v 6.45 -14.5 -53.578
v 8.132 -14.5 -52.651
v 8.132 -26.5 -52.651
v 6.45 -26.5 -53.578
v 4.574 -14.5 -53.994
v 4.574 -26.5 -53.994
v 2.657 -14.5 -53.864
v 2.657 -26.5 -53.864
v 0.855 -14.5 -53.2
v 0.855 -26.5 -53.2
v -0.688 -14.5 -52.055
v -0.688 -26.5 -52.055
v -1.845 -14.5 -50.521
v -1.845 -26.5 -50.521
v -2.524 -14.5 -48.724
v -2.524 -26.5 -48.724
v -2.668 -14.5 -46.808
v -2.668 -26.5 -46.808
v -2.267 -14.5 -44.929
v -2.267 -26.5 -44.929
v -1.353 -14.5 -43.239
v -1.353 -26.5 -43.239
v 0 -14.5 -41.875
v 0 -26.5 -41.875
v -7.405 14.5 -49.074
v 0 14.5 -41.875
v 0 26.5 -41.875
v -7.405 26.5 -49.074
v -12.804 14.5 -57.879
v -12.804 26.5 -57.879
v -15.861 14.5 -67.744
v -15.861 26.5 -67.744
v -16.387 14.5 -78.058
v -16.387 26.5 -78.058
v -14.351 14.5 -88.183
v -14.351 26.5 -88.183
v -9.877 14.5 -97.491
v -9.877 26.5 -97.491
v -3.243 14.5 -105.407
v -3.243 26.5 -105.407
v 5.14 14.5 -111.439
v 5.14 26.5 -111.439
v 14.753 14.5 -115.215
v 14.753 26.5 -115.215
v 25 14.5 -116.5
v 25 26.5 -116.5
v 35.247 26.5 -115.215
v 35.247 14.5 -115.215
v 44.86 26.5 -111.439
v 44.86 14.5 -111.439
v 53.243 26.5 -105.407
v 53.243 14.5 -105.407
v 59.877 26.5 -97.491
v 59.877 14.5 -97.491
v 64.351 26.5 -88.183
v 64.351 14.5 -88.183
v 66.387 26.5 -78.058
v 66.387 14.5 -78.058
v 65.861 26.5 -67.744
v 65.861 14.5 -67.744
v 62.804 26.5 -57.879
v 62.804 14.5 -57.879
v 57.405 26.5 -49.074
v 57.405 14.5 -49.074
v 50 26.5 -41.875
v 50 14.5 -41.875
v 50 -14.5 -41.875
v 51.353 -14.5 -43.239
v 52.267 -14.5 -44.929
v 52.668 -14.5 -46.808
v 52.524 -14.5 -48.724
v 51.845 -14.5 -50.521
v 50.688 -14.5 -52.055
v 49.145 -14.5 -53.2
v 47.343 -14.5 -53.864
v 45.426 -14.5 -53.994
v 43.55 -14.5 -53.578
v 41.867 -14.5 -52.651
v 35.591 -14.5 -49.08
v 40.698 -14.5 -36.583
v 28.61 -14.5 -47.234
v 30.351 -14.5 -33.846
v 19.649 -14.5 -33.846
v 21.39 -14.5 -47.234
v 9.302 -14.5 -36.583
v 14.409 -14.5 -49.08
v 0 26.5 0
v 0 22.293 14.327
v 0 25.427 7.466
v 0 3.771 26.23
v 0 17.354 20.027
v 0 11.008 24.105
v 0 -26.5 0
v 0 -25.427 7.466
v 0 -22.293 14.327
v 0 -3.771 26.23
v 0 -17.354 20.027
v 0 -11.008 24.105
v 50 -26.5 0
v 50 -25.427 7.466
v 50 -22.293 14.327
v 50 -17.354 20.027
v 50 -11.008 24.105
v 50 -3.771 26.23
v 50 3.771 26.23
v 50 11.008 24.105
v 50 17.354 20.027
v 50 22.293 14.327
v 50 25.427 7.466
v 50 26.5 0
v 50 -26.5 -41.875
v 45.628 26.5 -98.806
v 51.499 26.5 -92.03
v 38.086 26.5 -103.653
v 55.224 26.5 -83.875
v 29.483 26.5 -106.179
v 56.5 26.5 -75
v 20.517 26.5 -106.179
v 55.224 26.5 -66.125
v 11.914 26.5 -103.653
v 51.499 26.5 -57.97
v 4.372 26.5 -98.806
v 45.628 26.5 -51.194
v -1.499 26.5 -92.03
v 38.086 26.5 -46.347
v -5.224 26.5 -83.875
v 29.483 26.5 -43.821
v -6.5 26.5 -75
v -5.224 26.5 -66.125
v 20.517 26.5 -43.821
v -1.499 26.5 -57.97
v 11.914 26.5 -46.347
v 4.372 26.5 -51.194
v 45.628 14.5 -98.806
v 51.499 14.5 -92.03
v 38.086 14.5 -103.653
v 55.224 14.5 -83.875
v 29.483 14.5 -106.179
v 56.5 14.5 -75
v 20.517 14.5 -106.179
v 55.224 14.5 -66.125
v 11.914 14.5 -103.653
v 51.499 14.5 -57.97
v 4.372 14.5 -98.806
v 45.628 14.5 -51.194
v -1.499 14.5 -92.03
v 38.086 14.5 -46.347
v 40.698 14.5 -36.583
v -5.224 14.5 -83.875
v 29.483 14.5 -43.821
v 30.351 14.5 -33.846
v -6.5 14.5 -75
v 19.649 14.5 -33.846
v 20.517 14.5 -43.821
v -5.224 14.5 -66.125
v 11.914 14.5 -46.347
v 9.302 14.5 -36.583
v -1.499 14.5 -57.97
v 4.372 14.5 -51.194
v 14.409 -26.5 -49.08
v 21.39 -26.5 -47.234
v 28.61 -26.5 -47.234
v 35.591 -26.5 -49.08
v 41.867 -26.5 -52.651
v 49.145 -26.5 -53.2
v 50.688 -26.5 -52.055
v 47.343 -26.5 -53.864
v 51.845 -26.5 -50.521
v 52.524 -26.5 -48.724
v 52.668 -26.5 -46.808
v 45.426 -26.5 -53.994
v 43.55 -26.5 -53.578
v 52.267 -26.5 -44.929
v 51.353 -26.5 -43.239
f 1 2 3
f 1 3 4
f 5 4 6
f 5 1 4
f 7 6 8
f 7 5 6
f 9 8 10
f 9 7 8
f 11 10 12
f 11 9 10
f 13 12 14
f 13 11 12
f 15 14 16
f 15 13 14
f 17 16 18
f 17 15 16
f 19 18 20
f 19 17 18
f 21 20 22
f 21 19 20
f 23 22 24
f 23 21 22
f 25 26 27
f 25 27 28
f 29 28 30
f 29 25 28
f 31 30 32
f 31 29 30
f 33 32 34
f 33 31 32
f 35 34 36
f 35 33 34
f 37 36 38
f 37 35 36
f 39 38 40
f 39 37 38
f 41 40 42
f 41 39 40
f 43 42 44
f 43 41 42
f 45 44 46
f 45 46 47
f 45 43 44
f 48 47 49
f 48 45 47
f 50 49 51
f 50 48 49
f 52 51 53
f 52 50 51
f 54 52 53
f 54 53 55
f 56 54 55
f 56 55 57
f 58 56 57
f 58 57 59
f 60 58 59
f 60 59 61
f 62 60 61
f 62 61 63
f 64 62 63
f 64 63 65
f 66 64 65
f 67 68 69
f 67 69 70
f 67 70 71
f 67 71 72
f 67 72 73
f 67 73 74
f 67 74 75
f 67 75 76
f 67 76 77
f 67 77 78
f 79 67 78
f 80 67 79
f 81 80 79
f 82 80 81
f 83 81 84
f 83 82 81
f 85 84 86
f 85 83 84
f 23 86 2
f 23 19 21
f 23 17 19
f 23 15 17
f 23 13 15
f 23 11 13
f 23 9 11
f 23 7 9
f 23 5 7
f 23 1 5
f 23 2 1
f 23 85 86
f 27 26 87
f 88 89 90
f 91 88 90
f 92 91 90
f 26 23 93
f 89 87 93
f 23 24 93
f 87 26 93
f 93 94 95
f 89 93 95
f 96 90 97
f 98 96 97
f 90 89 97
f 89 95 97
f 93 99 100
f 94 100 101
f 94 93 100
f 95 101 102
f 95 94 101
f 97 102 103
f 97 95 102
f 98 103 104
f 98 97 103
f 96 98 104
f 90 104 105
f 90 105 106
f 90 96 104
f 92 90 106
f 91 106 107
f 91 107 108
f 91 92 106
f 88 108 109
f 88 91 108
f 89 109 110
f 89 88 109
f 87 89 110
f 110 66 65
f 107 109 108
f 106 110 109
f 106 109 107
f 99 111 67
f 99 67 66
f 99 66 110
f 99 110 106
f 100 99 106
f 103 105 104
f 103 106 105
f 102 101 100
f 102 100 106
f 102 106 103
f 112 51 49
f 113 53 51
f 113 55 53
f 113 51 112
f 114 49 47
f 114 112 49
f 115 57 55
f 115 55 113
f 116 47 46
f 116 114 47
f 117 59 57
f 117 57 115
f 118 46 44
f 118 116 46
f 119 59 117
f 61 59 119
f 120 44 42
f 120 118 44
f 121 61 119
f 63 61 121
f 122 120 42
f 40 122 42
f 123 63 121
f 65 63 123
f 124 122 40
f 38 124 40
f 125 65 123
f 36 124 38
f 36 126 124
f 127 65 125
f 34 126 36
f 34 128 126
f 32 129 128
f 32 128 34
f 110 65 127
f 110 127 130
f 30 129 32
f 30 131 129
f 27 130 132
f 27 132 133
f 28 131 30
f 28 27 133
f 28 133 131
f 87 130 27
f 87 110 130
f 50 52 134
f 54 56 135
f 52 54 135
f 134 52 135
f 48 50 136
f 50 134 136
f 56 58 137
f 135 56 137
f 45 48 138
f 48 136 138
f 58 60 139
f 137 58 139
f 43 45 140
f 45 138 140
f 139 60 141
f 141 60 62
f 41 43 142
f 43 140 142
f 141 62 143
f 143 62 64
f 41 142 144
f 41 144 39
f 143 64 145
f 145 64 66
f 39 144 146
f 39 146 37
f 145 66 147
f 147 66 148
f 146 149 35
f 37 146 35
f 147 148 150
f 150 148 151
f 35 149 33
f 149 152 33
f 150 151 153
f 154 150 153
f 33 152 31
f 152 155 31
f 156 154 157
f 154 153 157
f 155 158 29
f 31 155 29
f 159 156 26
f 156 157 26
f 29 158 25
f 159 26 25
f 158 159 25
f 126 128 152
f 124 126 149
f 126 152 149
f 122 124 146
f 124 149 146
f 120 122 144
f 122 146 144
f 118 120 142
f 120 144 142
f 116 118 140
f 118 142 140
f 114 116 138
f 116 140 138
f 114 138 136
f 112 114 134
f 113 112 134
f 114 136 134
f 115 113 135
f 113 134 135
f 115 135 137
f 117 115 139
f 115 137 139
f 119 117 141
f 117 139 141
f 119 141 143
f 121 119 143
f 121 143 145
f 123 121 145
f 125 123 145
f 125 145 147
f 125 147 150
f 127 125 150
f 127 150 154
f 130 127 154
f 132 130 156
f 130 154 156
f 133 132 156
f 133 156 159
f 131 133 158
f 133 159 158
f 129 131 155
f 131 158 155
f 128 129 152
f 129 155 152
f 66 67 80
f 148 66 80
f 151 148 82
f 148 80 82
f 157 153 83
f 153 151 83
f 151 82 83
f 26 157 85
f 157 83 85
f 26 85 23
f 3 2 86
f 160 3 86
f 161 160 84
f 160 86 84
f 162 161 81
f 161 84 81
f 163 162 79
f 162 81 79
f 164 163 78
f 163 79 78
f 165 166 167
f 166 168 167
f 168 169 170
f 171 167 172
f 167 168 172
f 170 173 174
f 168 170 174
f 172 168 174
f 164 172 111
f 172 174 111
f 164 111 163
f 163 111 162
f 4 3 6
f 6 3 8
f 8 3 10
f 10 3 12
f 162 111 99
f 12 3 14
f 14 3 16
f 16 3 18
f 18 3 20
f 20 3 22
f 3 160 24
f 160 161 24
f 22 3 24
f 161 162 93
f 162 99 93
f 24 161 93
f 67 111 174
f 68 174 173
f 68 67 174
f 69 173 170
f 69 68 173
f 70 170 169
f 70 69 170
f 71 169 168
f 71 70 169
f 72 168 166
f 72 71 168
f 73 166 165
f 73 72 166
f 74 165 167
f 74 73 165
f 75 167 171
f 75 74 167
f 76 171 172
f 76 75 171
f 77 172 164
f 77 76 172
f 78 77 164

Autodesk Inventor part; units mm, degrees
ref_plane "YZ Plane" through (0, 0, 0) normal (1, 0, 0) x (0, 1, 0)
sketch "Sketch2" plane through (0, 0, 0) normal (0, 1, 0) x (-1, 0, 0)
  circle A0 centre (-25, -75) radius 36 construction
  line L0 (-25, -75) -> (-61, -75) construction
  line L1 (-25, -75) -> (4.6941, -54.6466) construction
  circle A1 centre (-25, -75) radius 41.5
  circle A2 centre (-25, -75) radius 28
  arc A3 (-8.1325, -52.6508) -> (0, -41.8752) centre (-4.0663, -47.263) ccw
  arc A4 (-50, -41.8752) -> (-39.3017, -48.5193) centre (-45.9337, -47.263) ccw
  line L2 (-25, -75) -> (-4.0663, -47.263) construction
  circle A5 centre (-25, -75) radius 31.5
  line L3 (0, -41.8752) -> (0, 0)
  line L4 (-50, -41.8752) -> (-50, 0)
  line L5 (0, 0) -> (-50, 0)
  line L6 (-25, 0) -> (-25, -75) construction
  point P0 (15.9829, -68.469)
  point P1 (13.8342, -60.366)
  point P2 (-39.2078, -46.6936)
  point P3 (-41.8675, -52.6508)
  point P4 (-8.1325, -52.6508)
  dimension "d1" = 72
  dimension "d5" = 83
  dimension "d6" = 56
  dimension "d7" = 63
  dimension "d11" = 50
  dimension "d31" = 75
ref_plane "Work Plane1" through (0, -14.5, 0) normal (0, 1, 0) x (-1, 0, 0)
ref_plane "Work Plane2" through (0, 14.5, 0) normal (0, 1, 0) x (-1, 0, 0)
extrude "Extrusion1" add sketch "Sketch2" along normal blind 12 from surface at 14.5 contours A1 A4 A5 A3 | A3 A5 A4 A1
extrude "Extrusion2" add sketch "Sketch2" against normal blind 12 from surface at -14.5 contours A3 A5 A4 A1 | A3 A2 A4 A5 picked at (-44.9519, -42.6635) picked at (-38.3765, -47.944)
extrude "Extrusion3" add sketch "Sketch2" along normal mid plane 53 contours A1 L4 L5 L3
sketch "Sketch3" plane through (0, 0, 0) normal (1, 0, 0) x (0, 1, 0)
  line L0 (-26.5, 0) -> (26.5, 0) projected
  circle A0 centre (0, 0) radius 26.5
extrude "Extrusion4" add sketch "Sketch3" along normal up to surface (50 mm away)
properties part number "hip_back_left"
